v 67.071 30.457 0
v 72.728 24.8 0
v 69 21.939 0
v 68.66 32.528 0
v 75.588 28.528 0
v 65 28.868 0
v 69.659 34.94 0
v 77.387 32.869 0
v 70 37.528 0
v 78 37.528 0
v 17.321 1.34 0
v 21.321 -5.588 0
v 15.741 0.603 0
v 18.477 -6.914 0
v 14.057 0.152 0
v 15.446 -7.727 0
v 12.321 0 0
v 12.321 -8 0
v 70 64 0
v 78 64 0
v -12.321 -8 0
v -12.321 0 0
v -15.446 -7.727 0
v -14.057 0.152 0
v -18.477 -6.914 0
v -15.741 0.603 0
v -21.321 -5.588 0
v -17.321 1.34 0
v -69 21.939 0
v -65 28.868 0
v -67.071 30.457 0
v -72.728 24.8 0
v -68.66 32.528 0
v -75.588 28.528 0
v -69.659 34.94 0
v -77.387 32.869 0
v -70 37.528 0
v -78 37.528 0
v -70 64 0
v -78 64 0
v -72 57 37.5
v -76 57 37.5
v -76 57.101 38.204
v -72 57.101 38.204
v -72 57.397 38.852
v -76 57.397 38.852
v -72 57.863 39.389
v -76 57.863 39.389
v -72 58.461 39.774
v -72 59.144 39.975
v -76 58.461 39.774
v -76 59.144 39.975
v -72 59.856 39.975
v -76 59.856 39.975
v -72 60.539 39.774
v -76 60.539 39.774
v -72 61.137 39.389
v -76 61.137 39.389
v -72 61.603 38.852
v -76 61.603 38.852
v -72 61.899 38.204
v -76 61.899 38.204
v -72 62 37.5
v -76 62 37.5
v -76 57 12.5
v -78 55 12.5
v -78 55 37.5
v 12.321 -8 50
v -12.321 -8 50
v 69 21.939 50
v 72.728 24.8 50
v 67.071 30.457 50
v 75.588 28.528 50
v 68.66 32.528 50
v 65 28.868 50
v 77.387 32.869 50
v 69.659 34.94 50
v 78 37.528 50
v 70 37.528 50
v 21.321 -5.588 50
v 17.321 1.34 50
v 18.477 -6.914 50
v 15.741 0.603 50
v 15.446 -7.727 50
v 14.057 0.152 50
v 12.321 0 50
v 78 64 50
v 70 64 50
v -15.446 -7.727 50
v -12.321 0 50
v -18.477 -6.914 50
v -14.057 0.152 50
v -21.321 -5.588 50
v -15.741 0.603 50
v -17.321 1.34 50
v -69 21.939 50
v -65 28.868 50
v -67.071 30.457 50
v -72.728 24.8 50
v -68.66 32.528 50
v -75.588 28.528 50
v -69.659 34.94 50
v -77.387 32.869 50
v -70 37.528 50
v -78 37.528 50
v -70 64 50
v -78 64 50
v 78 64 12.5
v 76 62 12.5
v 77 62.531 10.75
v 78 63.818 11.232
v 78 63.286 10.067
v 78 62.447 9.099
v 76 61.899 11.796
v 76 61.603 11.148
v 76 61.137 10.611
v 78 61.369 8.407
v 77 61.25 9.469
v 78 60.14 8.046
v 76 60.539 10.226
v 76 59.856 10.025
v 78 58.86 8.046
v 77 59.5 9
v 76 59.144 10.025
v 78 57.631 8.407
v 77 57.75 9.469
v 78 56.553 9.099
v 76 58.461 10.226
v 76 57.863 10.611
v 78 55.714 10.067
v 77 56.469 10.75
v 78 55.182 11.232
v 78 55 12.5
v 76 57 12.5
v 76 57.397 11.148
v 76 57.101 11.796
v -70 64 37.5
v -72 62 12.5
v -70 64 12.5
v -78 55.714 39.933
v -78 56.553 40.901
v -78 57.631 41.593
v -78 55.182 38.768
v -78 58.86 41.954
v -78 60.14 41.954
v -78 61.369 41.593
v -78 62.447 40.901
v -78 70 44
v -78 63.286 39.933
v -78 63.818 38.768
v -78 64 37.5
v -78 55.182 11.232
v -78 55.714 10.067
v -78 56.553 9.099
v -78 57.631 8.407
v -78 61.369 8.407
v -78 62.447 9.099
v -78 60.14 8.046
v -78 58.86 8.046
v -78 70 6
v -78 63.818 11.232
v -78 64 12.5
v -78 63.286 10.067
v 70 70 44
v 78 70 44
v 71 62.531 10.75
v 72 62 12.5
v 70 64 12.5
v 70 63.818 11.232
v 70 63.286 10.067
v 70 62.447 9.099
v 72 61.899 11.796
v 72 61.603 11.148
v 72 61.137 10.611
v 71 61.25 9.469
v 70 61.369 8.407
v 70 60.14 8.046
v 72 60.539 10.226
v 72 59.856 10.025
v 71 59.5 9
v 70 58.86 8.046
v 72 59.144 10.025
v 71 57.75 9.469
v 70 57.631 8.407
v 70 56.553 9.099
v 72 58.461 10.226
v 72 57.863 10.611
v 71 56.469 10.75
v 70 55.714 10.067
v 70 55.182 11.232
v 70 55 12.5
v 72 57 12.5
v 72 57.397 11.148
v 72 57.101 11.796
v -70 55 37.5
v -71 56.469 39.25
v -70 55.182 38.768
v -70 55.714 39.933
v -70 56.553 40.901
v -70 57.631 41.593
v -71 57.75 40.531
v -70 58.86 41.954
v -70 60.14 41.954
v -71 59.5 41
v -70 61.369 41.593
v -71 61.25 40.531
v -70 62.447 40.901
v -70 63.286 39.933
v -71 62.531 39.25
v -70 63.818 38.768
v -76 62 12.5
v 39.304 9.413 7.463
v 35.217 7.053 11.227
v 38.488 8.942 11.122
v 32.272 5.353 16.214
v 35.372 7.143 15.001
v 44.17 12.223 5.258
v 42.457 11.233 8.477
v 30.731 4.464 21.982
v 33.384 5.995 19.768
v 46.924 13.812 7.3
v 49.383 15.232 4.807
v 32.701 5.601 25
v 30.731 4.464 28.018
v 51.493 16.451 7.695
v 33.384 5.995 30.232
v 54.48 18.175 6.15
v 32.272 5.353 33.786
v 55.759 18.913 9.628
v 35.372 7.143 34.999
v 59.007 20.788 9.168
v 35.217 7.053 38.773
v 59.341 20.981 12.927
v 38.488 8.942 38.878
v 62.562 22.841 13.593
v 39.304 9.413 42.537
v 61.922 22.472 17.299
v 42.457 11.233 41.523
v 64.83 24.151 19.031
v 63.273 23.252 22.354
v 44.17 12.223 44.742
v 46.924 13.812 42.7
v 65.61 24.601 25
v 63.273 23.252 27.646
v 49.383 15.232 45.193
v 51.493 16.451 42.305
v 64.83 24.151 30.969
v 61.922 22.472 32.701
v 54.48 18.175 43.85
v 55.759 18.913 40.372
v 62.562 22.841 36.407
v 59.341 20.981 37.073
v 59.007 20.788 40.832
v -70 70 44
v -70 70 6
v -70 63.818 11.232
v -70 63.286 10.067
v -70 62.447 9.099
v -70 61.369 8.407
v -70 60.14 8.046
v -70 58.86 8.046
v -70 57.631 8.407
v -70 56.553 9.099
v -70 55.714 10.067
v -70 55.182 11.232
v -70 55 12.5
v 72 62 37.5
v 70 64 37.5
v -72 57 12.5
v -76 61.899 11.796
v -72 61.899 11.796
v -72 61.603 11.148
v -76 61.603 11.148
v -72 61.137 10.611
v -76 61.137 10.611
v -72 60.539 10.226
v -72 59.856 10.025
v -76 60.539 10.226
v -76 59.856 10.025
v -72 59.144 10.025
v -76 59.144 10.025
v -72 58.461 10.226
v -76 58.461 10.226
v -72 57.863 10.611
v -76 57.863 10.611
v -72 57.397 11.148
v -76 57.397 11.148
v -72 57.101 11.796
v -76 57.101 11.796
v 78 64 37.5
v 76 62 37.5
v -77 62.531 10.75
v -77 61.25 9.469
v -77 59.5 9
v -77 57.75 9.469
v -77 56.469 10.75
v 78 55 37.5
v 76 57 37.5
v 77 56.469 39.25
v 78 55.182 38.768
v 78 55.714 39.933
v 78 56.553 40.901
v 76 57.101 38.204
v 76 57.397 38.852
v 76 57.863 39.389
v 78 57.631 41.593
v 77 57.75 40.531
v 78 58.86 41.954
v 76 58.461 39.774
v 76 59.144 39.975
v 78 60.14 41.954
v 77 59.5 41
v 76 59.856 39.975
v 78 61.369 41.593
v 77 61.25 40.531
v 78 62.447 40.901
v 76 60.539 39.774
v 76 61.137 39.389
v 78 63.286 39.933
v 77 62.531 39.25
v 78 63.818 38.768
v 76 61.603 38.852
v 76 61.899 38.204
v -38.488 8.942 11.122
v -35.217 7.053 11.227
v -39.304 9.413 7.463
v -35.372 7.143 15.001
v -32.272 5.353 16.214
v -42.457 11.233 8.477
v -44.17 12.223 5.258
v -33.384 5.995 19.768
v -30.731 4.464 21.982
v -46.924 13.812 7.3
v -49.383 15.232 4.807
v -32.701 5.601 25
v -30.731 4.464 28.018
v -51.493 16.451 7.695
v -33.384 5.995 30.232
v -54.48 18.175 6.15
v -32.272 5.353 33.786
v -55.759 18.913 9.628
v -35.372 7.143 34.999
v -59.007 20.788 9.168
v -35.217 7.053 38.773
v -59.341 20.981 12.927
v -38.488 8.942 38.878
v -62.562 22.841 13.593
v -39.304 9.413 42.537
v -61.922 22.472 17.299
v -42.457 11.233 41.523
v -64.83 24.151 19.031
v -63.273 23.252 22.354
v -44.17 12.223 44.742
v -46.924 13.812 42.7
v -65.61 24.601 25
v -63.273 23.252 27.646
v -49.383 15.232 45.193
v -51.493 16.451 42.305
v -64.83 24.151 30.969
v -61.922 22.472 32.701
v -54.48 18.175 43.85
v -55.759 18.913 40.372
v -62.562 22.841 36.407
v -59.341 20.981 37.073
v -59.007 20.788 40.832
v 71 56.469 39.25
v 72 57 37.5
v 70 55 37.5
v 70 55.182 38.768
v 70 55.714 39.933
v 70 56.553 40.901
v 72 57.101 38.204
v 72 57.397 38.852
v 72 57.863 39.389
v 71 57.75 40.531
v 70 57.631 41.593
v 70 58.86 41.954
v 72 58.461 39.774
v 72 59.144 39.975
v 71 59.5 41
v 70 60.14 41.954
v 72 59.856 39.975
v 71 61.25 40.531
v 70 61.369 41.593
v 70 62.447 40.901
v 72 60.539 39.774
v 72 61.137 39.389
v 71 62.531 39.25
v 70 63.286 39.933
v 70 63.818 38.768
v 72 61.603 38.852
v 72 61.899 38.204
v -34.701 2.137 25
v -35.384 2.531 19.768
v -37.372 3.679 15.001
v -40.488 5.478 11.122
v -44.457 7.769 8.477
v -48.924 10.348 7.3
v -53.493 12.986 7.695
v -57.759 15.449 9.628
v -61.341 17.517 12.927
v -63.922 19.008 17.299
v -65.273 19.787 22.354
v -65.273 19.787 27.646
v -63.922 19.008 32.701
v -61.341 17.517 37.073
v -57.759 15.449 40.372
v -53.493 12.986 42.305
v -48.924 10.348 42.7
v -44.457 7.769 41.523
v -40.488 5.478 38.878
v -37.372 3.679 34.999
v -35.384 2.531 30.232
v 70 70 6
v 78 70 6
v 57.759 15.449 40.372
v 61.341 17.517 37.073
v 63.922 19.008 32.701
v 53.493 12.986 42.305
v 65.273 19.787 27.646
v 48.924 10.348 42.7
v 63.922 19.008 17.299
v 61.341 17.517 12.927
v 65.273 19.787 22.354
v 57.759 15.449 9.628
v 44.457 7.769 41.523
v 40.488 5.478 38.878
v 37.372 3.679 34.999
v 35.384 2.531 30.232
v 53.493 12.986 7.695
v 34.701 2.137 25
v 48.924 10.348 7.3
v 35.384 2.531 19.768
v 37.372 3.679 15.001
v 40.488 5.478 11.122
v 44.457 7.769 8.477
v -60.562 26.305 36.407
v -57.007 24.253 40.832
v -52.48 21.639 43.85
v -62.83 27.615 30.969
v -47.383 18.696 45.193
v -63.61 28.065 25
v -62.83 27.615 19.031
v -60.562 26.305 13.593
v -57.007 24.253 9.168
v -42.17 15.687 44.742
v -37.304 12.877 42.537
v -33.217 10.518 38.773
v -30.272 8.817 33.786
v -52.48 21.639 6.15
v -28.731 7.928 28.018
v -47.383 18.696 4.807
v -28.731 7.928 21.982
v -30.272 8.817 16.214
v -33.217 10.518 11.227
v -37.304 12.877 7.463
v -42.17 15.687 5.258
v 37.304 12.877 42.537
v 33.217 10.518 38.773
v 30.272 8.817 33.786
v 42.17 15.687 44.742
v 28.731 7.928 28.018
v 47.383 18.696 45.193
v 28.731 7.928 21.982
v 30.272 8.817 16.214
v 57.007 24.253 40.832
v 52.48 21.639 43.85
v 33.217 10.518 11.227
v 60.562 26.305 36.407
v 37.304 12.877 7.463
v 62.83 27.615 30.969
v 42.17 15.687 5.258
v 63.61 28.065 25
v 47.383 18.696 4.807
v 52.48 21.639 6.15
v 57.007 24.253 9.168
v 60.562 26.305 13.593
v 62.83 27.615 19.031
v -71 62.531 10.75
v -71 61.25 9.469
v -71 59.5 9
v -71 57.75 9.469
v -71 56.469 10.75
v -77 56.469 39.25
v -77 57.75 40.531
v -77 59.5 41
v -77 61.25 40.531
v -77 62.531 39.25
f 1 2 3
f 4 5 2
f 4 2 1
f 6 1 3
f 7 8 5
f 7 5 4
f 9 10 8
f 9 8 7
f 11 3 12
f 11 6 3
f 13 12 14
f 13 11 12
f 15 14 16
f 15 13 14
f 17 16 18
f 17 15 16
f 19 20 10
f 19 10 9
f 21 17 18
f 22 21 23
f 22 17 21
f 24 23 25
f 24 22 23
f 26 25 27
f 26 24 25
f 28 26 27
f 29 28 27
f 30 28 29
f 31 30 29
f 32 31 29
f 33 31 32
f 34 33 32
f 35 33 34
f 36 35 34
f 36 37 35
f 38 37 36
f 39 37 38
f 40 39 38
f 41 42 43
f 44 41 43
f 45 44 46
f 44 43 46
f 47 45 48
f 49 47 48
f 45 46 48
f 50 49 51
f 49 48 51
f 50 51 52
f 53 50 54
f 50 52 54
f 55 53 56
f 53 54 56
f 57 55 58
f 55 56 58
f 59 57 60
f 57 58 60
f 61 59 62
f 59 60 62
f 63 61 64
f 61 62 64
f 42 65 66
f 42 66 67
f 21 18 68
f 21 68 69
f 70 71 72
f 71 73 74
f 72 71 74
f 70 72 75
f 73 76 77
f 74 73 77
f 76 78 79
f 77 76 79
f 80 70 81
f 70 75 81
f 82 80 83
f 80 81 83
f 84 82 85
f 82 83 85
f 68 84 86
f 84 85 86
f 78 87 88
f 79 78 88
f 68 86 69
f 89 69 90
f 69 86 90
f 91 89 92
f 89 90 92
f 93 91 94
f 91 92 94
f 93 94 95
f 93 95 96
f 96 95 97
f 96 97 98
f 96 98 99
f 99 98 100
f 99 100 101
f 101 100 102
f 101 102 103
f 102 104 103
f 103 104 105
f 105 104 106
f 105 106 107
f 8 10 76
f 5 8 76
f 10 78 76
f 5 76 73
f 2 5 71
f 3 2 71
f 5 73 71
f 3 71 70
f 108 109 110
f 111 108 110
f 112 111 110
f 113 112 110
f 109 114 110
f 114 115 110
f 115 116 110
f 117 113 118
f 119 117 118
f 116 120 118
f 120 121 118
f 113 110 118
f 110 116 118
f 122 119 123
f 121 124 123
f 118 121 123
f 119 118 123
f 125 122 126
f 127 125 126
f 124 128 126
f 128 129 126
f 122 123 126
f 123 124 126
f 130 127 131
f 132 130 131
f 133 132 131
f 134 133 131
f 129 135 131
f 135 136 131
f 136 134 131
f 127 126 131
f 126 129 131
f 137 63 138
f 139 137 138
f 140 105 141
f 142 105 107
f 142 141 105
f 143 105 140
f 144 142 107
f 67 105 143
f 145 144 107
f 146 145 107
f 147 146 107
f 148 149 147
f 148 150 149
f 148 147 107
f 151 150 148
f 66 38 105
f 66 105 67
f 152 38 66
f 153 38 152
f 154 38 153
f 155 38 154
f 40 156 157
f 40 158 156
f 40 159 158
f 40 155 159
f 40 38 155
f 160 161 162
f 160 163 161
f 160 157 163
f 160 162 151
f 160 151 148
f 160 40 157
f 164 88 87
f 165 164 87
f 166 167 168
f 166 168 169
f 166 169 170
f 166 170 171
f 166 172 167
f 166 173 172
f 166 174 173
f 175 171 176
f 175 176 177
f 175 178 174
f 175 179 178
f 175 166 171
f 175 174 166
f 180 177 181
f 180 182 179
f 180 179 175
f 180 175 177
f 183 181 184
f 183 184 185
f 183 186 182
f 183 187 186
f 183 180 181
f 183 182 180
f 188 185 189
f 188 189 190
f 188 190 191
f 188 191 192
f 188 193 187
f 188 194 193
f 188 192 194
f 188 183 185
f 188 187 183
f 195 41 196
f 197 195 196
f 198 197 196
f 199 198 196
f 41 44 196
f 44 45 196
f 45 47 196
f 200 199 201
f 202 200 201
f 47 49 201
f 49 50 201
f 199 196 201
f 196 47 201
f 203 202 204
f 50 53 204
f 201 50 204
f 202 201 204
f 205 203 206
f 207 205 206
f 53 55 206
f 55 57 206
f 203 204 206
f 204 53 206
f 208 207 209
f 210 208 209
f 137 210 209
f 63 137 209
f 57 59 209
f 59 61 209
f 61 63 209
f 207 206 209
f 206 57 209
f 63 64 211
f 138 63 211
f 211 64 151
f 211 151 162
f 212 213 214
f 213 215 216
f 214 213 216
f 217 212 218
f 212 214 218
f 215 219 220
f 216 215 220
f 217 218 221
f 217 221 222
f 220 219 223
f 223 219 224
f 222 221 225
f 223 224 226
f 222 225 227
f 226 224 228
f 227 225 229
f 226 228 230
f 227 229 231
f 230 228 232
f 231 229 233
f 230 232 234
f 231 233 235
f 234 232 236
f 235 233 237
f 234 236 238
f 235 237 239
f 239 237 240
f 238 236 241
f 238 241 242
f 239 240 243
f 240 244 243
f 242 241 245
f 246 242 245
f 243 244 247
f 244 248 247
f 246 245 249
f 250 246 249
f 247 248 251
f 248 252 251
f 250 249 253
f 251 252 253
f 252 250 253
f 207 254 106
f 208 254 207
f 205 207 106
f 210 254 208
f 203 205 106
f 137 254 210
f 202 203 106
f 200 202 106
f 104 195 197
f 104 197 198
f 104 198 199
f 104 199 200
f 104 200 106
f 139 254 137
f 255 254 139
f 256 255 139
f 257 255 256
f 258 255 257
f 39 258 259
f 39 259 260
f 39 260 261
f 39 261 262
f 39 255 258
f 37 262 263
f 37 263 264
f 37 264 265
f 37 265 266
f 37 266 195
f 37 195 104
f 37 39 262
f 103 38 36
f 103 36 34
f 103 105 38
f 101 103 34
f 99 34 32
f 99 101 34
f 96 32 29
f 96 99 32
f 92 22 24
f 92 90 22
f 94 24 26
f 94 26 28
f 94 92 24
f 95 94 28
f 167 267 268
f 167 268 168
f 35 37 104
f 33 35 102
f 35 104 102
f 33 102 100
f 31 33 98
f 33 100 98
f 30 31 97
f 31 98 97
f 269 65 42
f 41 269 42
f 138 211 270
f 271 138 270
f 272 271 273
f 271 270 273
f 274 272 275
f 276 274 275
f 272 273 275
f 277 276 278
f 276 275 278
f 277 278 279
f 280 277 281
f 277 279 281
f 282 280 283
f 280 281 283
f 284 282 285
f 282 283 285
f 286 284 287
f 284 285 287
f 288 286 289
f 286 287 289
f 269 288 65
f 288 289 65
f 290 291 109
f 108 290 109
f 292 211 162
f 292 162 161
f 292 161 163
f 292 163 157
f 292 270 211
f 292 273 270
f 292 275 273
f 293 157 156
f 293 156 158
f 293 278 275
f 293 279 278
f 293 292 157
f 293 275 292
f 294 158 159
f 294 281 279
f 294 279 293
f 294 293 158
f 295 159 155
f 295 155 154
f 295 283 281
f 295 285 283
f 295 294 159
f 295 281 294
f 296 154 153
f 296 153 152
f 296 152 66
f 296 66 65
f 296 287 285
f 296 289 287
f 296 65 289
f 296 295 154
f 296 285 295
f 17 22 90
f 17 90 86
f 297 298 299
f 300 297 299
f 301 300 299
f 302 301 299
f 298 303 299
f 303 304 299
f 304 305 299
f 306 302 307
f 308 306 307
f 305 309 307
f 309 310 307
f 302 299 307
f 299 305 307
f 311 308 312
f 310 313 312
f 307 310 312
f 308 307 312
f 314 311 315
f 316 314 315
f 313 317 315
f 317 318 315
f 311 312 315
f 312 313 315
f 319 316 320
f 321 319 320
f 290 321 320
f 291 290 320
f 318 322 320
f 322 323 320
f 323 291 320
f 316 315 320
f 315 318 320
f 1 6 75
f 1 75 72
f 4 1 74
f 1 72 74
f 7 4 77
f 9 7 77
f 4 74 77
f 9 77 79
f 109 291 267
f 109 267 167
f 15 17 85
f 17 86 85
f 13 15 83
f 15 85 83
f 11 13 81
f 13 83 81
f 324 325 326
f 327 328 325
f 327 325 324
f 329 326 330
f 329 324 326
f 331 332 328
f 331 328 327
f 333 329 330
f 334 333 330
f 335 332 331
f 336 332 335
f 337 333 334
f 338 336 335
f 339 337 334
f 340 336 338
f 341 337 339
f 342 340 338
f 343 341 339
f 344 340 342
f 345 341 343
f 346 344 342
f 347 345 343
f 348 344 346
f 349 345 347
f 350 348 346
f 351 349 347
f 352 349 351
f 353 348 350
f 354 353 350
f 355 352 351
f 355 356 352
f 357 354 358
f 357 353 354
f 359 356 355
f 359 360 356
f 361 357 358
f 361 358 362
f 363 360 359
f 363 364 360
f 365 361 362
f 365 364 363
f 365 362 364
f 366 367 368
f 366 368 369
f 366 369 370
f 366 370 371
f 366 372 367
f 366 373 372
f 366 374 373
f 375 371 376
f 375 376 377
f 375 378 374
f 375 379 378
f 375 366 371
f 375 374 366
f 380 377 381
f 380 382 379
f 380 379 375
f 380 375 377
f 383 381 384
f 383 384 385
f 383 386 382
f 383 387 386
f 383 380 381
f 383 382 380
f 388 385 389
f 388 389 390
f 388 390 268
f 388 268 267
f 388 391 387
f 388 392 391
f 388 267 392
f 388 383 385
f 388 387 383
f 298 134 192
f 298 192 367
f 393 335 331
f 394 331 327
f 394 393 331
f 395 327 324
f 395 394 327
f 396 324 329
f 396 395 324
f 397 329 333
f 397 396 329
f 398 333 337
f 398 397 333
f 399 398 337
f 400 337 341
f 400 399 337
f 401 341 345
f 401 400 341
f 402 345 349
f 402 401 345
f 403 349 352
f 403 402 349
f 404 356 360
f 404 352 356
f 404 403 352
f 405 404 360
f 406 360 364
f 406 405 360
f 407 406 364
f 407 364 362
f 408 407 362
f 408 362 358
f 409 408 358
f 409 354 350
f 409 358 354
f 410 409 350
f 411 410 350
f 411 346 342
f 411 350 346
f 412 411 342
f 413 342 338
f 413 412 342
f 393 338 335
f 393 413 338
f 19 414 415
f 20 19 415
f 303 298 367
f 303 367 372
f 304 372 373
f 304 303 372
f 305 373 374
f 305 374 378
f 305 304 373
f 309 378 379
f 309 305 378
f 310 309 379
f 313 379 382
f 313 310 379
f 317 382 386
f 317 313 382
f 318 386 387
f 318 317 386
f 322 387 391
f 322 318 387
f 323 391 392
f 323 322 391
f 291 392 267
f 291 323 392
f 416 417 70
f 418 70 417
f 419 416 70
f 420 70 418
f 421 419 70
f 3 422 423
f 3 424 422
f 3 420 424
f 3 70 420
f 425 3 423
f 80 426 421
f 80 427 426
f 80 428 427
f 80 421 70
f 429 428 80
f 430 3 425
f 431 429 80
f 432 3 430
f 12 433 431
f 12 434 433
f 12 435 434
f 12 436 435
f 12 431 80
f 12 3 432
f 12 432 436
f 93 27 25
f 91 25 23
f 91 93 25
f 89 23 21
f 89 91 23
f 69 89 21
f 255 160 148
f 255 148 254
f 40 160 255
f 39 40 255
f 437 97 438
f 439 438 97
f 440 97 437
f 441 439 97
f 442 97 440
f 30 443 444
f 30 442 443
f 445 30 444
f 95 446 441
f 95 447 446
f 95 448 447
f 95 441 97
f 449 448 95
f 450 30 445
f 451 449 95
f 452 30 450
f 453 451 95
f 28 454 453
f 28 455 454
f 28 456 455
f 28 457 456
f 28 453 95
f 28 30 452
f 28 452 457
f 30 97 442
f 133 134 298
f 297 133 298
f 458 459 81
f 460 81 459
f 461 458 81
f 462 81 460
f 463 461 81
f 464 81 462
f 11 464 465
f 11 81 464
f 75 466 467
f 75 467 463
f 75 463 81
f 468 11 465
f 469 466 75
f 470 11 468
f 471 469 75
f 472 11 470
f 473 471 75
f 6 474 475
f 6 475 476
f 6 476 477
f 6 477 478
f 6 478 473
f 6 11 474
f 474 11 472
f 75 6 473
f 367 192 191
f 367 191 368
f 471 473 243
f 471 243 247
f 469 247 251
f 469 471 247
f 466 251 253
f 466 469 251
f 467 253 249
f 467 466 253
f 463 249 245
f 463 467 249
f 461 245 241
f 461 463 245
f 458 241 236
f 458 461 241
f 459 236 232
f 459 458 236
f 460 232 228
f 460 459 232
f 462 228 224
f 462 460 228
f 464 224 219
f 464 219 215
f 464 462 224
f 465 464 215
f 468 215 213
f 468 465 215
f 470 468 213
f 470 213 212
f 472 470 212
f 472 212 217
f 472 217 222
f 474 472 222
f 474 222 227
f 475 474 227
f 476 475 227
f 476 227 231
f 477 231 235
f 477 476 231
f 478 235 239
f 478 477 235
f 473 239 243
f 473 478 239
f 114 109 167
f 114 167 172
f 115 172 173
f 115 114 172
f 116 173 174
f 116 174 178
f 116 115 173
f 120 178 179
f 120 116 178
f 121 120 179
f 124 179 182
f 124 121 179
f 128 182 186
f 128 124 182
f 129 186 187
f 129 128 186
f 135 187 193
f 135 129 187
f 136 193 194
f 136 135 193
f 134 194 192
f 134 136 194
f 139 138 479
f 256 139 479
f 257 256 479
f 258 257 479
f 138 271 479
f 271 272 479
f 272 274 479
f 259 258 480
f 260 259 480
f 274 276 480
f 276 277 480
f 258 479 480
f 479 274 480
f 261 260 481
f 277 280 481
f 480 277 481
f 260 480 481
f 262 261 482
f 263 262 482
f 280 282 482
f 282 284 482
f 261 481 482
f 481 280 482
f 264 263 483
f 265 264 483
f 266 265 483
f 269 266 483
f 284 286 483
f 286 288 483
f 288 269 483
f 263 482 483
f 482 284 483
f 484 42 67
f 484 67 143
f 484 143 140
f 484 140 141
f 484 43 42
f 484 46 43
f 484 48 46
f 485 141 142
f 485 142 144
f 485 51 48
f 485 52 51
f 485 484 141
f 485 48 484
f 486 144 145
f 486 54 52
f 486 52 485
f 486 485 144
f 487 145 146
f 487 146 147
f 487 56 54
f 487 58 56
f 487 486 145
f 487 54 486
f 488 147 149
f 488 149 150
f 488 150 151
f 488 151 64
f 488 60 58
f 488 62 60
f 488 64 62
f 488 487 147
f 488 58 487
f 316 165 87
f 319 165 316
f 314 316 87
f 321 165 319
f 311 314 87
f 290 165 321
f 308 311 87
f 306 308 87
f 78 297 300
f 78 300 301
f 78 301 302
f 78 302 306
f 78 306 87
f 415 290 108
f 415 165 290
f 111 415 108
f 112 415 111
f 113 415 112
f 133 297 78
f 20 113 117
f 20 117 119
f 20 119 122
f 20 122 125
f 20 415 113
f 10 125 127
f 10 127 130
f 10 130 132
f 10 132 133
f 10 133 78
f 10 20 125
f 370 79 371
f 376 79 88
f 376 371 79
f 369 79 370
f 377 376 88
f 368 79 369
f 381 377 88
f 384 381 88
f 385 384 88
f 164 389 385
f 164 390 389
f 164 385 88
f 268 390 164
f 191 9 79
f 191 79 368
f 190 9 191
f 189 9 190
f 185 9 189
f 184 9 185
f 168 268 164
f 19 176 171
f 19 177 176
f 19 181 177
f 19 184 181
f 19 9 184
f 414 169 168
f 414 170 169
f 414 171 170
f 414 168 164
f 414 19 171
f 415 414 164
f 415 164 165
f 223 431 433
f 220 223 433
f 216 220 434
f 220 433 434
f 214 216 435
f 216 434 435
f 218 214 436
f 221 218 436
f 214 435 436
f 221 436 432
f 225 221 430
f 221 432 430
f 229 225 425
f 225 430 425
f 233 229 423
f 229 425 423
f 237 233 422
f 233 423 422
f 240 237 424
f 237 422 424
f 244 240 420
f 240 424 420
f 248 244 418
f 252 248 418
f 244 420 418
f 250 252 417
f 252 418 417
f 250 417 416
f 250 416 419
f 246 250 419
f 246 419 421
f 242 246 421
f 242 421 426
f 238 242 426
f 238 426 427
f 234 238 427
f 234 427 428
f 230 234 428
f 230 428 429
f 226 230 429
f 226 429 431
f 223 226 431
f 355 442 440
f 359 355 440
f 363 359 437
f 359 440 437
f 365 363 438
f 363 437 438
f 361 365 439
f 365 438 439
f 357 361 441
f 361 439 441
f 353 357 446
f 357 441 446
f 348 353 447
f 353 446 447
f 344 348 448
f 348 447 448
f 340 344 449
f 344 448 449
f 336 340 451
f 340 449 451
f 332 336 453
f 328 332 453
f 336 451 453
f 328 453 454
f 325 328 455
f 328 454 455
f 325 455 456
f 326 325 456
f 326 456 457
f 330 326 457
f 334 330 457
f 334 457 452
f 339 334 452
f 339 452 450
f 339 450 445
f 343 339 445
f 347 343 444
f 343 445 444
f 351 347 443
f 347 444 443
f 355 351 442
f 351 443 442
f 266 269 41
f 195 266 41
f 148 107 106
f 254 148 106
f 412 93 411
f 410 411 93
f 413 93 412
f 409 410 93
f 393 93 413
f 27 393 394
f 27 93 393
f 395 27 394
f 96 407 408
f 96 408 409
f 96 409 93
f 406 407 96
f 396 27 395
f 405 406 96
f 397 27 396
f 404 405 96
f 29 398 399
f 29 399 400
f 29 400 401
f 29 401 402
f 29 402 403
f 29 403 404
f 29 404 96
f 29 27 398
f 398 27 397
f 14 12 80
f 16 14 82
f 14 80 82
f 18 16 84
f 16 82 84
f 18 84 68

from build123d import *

# Parameters (mm, degrees)
BOSS_EXTRUDE1_DEPTH      = 50
FILLET1_R                = 10
FILLET2_R                = 18
CUT_EXTRUDE1_DEPTH       = 8
CHAMFER1_SIZE            = 2
CHAMFER2_SIZE            = 6
SKETCH3_R                = 17.75
CUT_EXTRUDE2_DEPTH       = 8
SKETCH4_R                = 20.25
CUT_EXTRUDE3_DEPTH       = 4
CHAMFER1_OF_MIRROR2_SIZE = 2
CHAMFER2_OF_MIRROR2_SIZE = 6


with BuildPart() as part:
    # Sketch1 → Boss-Extrude1 (new body)
    with BuildSketch(Plane.XY):
        Polygon((-15, 0), (15, 0), (70, 31.754264805), (70, 70), (78, 70), (78, 27.135462652), (17.143593539, -8), (-17.143593539, -8), (-78, 27.135462652), (-78, 70), (-70, 70), (-70, 31.754264805), align=None)
    extrude(amount=BOSS_EXTRUDE1_DEPTH)

    # Fillet1
    fillet1_edges = [part.edges().sort_by_distance(p)[0] for p in [
        (-15, 0, 25),
        (15, 0, 25),
        (70, 31.754264805, 25),
        (-70, 31.754264805, 25),
    ]]
    fillet(fillet1_edges, radius=FILLET1_R)

    # Fillet2
    fillet2_edges = [part.edges().sort_by_distance(p)[0] for p in [
        (78, 27.135462652, 25),
        (17.143593539, -8, 25),
        (-17.143593539, -8, 25),
        (-78, 27.135462652, 25),
    ]]
    fillet(fillet2_edges, radius=FILLET2_R)

    # Sketch2 → Cut-Extrude1 (cut)
    with BuildSketch(Plane(origin=(-78, 160.753072215, 0), x_dir=(0, 0, 1), z_dir=(1, 0, 0))):
        with BuildLine():
            Line((12.5, 103.753072215), (37.5, 103.753072215))
            ThreePointArc((37.5, 103.753072215), (40, 101.253072215), (37.5, 98.753072215))
            Line((37.5, 98.753072215), (12.5, 98.753072215))
            ThreePointArc((12.5, 98.753072215), (10, 101.253072215), (12.5, 103.753072215))
        make_face()
    cut_extrude1 = extrude(amount=CUT_EXTRUDE1_DEPTH, mode=Mode.SUBTRACT)

    # Chamfer1
    chamfer1_edges = [part.edges().sort_by_distance(p)[0] for p in [
        (-70, 59.5, 10),
        (-78, 59.5, 10),
        (-70, 62, 25),
        (-78, 62, 25),
        (-70, 59.5, 40),
        (-78, 59.5, 40),
        (-70, 57, 25),
        (-78, 57, 25),
    ]]
    chamfer(chamfer1_edges, length=CHAMFER1_SIZE)

    # Chamfer2
    chamfer2_edges = [part.edges().sort_by_distance(p)[0] for p in [
        (-74, 70, 50),
        (-74, 70, 0),
    ]]
    chamfer(chamfer2_edges, length=CHAMFER2_SIZE)

    # Sketch3 → Cut-Extrude2 (cut)
    with BuildSketch(Plane(origin=(-27.350055988, -2.107296158, 0), x_dir=(0, 0, 1), z_dir=(0.5, 0.866025404, 0))):
        with Locations(Location((25, -26.237677779, 0), (0, 0, 90))):  # turned: the seam where the file's is
            Circle(SKETCH3_R)
    cut_extrude2 = extrude(amount=CUT_EXTRUDE2_DEPTH, mode=Mode.SUBTRACT)

    # Sketch4 → Cut-Extrude3 (cut)
    with BuildSketch(Plane(origin=(-3.75, -6.495190528, 0), x_dir=(0, 0, -1), z_dir=(0.5, 0.866025404, 0))):
        with Locations(Location((-25, 48.869872981, 0), (0, 0, 90))):  # turned: the seam where the file's is
            Circle(SKETCH4_R)
    cut_extrude3 = extrude(amount=-CUT_EXTRUDE3_DEPTH, mode=Mode.SUBTRACT)

    # Mirror2: Cut-Extrude1, Cut-Extrude2, Cut-Extrude3 across plane
    add(cut_extrude1.mirror(Plane(origin=(0, 0, 0), x_dir=(0, 0, 1), z_dir=(1, 0, 0))), mode=Mode.SUBTRACT)
    add(cut_extrude2.mirror(Plane(origin=(0, 0, 0), x_dir=(0, 0, 1), z_dir=(1, 0, 0))), mode=Mode.SUBTRACT)
    add(cut_extrude3.mirror(Plane(origin=(0, 0, 0), x_dir=(0, 0, 1), z_dir=(1, 0, 0))), mode=Mode.SUBTRACT)

    # Chamfer1 of Mirror2
    chamfer1_of_mirror2_edges = [part.edges().sort_by_distance(p)[0] for p in [
        (70, 59.5, 10),
        (78, 59.5, 10),
        (70, 62, 25),
        (78, 62, 25),
        (70, 59.5, 40),
        (78, 59.5, 40),
        (70, 57, 25),
        (78, 57, 25),
    ]]
    chamfer(chamfer1_of_mirror2_edges, length=CHAMFER1_OF_MIRROR2_SIZE)

    # Chamfer2 of Mirror2
    chamfer2_of_mirror2_edges = [part.edges().sort_by_distance(p)[0] for p in [
        (74, 70, 50),
        (74, 70, 0),
    ]]
    chamfer(chamfer2_of_mirror2_edges, length=CHAMFER2_OF_MIRROR2_SIZE)


solid = part.part
